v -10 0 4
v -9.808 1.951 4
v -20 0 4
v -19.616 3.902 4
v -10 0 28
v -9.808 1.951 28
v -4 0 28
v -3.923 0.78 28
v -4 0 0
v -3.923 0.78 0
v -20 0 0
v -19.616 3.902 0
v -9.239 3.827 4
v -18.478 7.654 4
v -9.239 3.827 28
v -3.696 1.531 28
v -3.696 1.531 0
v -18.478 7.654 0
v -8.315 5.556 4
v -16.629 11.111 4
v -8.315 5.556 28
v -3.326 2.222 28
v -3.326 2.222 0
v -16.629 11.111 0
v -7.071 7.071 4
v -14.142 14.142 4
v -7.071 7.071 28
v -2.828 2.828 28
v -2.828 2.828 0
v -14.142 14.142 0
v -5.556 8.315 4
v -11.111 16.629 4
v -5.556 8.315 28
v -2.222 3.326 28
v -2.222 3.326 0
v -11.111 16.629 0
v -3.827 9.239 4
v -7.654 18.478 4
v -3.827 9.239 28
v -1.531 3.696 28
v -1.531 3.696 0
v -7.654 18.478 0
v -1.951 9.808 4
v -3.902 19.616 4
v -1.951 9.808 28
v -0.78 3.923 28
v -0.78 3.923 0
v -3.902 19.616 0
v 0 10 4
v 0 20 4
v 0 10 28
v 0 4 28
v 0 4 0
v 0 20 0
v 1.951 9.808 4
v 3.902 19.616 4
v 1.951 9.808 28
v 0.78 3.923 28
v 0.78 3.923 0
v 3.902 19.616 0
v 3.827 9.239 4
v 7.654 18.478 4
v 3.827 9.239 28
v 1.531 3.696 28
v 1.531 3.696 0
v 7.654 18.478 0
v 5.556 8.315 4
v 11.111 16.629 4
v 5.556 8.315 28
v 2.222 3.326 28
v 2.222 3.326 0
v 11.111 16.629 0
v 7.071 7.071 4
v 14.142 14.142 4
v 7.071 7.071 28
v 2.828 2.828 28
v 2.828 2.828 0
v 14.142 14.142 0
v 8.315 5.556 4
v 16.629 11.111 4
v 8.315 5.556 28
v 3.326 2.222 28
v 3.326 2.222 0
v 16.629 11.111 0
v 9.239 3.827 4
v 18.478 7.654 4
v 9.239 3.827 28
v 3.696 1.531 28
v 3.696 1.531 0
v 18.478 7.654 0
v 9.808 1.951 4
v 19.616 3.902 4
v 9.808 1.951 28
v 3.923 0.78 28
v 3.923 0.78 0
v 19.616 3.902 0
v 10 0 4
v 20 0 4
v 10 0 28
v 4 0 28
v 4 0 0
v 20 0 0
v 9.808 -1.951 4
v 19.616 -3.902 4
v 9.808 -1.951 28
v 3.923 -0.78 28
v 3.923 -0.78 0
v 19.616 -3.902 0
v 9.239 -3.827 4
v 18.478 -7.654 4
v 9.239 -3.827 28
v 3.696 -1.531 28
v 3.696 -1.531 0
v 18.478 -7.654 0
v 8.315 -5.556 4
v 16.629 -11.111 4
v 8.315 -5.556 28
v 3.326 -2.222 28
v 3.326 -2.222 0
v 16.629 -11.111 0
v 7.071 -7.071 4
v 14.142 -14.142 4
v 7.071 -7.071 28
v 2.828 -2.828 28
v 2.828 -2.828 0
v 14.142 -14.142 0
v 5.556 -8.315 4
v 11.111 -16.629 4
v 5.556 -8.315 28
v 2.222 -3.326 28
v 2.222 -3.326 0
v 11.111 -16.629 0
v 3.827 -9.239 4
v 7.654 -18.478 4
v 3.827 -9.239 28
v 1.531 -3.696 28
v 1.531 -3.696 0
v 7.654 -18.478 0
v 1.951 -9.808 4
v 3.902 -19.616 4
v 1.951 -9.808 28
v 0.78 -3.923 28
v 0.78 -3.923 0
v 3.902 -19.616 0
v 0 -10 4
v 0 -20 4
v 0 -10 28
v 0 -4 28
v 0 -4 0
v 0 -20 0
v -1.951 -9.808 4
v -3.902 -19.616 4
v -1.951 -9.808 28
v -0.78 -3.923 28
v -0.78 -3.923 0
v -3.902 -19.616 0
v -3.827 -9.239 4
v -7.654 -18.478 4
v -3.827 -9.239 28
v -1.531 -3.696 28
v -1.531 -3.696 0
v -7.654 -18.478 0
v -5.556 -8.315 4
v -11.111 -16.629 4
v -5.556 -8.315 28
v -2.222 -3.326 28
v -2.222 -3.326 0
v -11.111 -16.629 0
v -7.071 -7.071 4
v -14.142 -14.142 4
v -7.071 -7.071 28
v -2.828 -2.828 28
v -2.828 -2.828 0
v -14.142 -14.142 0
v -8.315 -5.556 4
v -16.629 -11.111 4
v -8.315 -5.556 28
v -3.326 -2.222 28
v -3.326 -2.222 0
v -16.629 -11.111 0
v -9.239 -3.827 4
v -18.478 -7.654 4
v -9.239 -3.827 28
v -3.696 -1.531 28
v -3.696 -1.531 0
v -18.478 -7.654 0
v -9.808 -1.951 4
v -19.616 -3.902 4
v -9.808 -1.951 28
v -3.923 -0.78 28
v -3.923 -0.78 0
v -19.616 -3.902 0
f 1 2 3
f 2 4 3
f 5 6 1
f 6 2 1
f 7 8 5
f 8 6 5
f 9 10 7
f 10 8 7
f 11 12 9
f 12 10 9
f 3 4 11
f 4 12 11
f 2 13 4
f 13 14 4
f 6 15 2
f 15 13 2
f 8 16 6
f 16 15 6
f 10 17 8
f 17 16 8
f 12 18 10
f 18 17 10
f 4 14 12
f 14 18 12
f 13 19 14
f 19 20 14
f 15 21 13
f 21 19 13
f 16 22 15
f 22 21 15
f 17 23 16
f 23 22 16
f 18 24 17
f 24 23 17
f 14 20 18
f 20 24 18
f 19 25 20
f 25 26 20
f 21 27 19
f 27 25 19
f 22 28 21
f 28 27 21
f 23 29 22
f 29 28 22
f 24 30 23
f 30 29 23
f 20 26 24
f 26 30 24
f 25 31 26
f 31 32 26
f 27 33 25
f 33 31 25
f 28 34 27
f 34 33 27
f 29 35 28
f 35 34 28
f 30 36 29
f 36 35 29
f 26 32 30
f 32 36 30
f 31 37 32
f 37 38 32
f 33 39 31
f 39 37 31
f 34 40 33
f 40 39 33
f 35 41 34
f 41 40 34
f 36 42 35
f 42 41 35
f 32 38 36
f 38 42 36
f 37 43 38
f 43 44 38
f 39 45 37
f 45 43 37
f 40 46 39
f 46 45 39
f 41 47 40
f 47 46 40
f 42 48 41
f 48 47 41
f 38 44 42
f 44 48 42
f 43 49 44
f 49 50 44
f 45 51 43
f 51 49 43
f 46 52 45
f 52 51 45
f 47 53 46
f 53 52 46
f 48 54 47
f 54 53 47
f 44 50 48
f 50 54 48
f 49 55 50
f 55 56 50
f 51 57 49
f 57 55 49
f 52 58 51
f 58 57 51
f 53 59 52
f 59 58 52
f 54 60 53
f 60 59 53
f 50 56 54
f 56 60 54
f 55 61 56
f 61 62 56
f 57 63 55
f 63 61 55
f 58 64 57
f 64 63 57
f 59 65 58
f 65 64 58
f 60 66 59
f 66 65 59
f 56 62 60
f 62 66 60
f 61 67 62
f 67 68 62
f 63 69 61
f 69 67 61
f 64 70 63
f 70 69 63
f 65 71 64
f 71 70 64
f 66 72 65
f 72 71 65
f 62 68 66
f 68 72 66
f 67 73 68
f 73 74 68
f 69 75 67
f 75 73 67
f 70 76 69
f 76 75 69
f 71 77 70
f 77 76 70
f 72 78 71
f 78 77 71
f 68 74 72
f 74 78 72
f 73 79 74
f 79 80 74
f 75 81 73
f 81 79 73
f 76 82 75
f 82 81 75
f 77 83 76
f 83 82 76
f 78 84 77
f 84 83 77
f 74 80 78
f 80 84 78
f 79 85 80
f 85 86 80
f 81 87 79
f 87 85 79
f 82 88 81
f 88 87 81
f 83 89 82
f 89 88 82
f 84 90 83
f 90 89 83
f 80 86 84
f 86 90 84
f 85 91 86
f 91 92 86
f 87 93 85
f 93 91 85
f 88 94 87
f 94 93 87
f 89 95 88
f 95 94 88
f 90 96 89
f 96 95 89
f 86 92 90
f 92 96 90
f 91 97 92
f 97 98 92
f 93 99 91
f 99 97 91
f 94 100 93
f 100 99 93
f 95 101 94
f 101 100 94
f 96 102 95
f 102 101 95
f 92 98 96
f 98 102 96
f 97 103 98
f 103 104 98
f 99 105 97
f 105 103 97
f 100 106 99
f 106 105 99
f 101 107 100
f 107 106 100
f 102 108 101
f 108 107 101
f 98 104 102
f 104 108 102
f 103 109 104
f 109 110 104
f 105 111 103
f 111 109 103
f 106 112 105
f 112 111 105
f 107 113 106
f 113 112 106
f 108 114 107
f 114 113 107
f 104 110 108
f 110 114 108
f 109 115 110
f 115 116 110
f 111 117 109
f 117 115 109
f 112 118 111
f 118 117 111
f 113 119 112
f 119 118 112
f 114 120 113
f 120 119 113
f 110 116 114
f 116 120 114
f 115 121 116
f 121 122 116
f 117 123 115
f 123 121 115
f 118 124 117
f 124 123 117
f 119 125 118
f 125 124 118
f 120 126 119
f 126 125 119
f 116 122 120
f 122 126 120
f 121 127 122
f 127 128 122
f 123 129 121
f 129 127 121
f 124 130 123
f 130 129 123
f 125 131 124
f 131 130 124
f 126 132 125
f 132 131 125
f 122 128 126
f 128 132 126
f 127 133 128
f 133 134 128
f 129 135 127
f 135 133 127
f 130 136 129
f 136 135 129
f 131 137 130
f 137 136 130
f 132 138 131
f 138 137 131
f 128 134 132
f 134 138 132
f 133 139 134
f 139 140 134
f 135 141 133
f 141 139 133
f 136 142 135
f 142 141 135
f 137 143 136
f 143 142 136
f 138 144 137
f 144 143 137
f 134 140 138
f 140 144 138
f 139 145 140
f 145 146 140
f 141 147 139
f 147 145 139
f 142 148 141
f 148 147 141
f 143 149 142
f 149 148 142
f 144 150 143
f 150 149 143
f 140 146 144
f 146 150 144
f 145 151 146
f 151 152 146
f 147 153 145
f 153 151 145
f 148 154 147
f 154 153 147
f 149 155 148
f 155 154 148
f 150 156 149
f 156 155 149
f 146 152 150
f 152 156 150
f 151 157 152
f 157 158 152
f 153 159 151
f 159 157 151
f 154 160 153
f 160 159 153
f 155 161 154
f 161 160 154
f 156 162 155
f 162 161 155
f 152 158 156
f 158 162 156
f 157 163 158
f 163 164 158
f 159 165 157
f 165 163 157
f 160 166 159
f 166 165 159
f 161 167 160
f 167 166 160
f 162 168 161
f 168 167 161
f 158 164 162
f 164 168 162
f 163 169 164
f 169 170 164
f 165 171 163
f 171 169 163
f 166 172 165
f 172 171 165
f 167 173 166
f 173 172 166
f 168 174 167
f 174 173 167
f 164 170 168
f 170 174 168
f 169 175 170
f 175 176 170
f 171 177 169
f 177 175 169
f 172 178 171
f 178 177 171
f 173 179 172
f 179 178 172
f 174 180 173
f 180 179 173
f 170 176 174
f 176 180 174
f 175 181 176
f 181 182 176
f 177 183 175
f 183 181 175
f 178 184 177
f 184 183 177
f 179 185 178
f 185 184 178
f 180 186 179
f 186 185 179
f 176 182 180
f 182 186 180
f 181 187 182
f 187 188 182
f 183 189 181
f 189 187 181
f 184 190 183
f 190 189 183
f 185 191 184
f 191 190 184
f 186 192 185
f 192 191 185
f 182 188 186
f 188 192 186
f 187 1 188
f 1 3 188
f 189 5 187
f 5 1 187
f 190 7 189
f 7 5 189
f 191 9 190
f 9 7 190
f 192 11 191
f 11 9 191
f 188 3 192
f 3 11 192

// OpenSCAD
$fn = 32;

// ----------------------------------------------------------------------
// Revolved part: flanged bushing R20
// ----------------------------------------------------------------------

// --- parameters (mm) ---
bore_r = 4;               // bore radius
flange_r = 20;            // flange radius
flange_h = 4;             // flange thickness
sleeve_r = 10;            // sleeve radius
total_h = 28;             // overall height
revolve_angle = 360;      // revolve sweep, degrees

bore_d = 2 * bore_r;
flange_d = 2 * flange_r;
sleeve_d = 2 * sleeve_r;

profile = [[4, 0], [20, 0], [20, 4], [10, 4], [10, 28], [4, 28]];  // primary outline, 6 points, counter clockwise

// --- the one profile operation ---
rotate_extrude(angle = revolve_angle) polygon(points = profile);
